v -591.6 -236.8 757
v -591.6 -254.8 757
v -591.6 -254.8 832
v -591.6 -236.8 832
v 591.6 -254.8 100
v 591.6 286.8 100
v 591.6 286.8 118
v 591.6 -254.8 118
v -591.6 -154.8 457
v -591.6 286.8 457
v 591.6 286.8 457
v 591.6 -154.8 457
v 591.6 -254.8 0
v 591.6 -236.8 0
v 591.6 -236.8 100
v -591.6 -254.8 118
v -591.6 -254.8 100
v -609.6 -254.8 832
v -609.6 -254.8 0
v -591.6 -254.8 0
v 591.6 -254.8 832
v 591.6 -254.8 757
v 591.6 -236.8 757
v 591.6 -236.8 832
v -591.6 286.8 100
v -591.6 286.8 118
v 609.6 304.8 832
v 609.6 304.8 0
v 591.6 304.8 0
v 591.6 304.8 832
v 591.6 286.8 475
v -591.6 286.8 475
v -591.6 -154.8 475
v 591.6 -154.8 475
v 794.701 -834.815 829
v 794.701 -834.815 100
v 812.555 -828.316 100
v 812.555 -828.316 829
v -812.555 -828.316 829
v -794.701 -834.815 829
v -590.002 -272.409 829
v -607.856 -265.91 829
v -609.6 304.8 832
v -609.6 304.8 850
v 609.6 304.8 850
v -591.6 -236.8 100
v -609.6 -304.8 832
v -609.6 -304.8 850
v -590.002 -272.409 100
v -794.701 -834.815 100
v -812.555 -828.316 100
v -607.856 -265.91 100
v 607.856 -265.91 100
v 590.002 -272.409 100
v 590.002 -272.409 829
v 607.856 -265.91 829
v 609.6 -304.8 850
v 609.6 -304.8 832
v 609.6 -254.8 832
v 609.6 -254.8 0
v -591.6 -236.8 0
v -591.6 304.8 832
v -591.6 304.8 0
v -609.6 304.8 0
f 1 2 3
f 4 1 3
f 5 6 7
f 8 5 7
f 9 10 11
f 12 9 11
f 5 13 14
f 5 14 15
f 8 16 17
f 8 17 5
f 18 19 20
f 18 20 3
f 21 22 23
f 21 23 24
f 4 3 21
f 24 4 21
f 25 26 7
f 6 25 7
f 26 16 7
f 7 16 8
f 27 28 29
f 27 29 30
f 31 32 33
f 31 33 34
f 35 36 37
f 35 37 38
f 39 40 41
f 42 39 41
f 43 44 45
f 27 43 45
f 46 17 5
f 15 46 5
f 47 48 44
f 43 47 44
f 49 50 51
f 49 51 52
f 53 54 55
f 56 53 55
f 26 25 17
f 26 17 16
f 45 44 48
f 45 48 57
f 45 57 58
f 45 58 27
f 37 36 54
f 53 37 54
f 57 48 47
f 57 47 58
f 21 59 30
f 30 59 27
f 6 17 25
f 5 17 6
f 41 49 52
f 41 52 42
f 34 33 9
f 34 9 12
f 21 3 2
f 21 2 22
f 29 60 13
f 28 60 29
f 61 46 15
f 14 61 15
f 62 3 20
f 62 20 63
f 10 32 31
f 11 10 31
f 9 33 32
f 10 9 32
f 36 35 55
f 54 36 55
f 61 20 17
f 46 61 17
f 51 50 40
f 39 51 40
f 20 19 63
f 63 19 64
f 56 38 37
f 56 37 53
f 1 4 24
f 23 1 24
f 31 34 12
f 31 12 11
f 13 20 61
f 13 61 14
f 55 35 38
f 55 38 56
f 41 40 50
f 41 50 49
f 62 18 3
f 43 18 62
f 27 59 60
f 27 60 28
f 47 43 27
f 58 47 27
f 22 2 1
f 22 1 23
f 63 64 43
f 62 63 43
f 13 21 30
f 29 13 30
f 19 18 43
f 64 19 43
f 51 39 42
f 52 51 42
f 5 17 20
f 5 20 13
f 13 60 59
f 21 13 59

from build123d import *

# Parameters (mm, degrees)
F1_W      = 1219.2
F1_H      = 609.6
F2_DEPTH  = 18
F3_W      = 559.6
F3_H      = 832
F4_DEPTH  = 18
F7_DEPTH  = 18
F8_W      = 1183.2
F8_H      = 75
F9_DEPTH  = 18
F8_H_2    = 100
F10_DEPTH = 18
F8_H_3    = 18
F11_DEPTH = 541.6
F13_DEPTH = 1219.2
F15_W     = 1183.2
F15_H     = 441.6
F16_DEPTH = 18
F19_W     = 598.5
F19_H     = 729
F20_DEPTH = 19


with BuildPart() as f2:
    # F1 (on offset) → F2 (new body)
    with BuildSketch(Plane.XY.offset(850)):
        Rectangle(F1_W, F1_H)
    extrude(amount=-F2_DEPTH)


with BuildPart() as f4:
    # F3 (on face) → F4 (new body)
    with BuildSketch(Plane.YZ.offset(609.6)):
        with Locations((25, 416)):
            Rectangle(F3_W, F3_H)
    extrude(amount=-F4_DEPTH)


with BuildPart() as f5_1:
    # F5: instance of F4
    add(f4.part.mirror(Plane.YZ))


with BuildPart() as f7:
    # F6 (on face) → F7 (new body)
    with BuildSketch(Plane(origin=(0, 304.8, 0), x_dir=(-1, 0, 0), z_dir=(0, 1, 0))):
        Polygon((-591.6, 832), (-591.6, 0), (591.6, 0), (591.6, 832), (609.6, 832), (609.6, 1782), (-609.6, 1782), (-609.6, 832), align=None)
    extrude(amount=-F7_DEPTH)

    # F12 (on face) → F13 (join, through all)
    with BuildSketch(Plane.YZ.offset(609.6)):
        Polygon((247.8, 1782), (304.8, 1782), (304.8, 1800), (229.8, 1800), (229.8, 1782), (229.8, 1760), (247.8, 1760), align=None)
    extrude(amount=-F13_DEPTH)


with BuildPart() as f9:
    # F8 (on face) → F9 (new body)
    with BuildSketch(Plane.XZ.offset(254.8)):
        with Locations((0, 794.5)):
            Rectangle(F8_W, F8_H)
    extrude(amount=-F9_DEPTH)


with BuildPart() as f10:
    # F8 (on face) → F10 (new body)
    with BuildSketch(Plane.XZ.offset(254.8)):
        with Locations((0, 50)):
            Rectangle(F8_W, F8_H_2)
    extrude(amount=-F10_DEPTH)


with BuildPart() as f11:
    # F8 (on face) → F11 (new body, through all)
    with BuildSketch(Plane.XZ.offset(254.8)):
        with Locations((0, 109)):
            Rectangle(F8_W, F8_H_3)
    extrude(amount=-F11_DEPTH)


with BuildPart() as f16:
    # F15 (on mid) → F16 (new body)
    with BuildSketch(Plane.XY.offset(475)):
        with Locations((0, 66)):
            Rectangle(F15_W, F15_H)
    extrude(amount=-F16_DEPTH)


with BuildPart() as f20:
    # F19 (on line) → F20 (new body)
    with BuildSketch(Plane(origin=(433.434141094, 157.7571258729, 0), x_dir=(-0.3420201433, 0.9396926208, 0), z_dir=(0.9396926208, 0.3420201433, 0))):
        with Locations((-757.0227965677, 464.5)):
            Rectangle(F19_W, F19_H)
    extrude(amount=F20_DEPTH)


with BuildPart() as f21_1:
    # F21: instance of F20
    add(f20.part.mirror(Plane.YZ))


solid = Compound([f2.part, f4.part, f5_1.part, f9.part, f10.part, f11.part, f16.part, f20.part, f21_1.part])
